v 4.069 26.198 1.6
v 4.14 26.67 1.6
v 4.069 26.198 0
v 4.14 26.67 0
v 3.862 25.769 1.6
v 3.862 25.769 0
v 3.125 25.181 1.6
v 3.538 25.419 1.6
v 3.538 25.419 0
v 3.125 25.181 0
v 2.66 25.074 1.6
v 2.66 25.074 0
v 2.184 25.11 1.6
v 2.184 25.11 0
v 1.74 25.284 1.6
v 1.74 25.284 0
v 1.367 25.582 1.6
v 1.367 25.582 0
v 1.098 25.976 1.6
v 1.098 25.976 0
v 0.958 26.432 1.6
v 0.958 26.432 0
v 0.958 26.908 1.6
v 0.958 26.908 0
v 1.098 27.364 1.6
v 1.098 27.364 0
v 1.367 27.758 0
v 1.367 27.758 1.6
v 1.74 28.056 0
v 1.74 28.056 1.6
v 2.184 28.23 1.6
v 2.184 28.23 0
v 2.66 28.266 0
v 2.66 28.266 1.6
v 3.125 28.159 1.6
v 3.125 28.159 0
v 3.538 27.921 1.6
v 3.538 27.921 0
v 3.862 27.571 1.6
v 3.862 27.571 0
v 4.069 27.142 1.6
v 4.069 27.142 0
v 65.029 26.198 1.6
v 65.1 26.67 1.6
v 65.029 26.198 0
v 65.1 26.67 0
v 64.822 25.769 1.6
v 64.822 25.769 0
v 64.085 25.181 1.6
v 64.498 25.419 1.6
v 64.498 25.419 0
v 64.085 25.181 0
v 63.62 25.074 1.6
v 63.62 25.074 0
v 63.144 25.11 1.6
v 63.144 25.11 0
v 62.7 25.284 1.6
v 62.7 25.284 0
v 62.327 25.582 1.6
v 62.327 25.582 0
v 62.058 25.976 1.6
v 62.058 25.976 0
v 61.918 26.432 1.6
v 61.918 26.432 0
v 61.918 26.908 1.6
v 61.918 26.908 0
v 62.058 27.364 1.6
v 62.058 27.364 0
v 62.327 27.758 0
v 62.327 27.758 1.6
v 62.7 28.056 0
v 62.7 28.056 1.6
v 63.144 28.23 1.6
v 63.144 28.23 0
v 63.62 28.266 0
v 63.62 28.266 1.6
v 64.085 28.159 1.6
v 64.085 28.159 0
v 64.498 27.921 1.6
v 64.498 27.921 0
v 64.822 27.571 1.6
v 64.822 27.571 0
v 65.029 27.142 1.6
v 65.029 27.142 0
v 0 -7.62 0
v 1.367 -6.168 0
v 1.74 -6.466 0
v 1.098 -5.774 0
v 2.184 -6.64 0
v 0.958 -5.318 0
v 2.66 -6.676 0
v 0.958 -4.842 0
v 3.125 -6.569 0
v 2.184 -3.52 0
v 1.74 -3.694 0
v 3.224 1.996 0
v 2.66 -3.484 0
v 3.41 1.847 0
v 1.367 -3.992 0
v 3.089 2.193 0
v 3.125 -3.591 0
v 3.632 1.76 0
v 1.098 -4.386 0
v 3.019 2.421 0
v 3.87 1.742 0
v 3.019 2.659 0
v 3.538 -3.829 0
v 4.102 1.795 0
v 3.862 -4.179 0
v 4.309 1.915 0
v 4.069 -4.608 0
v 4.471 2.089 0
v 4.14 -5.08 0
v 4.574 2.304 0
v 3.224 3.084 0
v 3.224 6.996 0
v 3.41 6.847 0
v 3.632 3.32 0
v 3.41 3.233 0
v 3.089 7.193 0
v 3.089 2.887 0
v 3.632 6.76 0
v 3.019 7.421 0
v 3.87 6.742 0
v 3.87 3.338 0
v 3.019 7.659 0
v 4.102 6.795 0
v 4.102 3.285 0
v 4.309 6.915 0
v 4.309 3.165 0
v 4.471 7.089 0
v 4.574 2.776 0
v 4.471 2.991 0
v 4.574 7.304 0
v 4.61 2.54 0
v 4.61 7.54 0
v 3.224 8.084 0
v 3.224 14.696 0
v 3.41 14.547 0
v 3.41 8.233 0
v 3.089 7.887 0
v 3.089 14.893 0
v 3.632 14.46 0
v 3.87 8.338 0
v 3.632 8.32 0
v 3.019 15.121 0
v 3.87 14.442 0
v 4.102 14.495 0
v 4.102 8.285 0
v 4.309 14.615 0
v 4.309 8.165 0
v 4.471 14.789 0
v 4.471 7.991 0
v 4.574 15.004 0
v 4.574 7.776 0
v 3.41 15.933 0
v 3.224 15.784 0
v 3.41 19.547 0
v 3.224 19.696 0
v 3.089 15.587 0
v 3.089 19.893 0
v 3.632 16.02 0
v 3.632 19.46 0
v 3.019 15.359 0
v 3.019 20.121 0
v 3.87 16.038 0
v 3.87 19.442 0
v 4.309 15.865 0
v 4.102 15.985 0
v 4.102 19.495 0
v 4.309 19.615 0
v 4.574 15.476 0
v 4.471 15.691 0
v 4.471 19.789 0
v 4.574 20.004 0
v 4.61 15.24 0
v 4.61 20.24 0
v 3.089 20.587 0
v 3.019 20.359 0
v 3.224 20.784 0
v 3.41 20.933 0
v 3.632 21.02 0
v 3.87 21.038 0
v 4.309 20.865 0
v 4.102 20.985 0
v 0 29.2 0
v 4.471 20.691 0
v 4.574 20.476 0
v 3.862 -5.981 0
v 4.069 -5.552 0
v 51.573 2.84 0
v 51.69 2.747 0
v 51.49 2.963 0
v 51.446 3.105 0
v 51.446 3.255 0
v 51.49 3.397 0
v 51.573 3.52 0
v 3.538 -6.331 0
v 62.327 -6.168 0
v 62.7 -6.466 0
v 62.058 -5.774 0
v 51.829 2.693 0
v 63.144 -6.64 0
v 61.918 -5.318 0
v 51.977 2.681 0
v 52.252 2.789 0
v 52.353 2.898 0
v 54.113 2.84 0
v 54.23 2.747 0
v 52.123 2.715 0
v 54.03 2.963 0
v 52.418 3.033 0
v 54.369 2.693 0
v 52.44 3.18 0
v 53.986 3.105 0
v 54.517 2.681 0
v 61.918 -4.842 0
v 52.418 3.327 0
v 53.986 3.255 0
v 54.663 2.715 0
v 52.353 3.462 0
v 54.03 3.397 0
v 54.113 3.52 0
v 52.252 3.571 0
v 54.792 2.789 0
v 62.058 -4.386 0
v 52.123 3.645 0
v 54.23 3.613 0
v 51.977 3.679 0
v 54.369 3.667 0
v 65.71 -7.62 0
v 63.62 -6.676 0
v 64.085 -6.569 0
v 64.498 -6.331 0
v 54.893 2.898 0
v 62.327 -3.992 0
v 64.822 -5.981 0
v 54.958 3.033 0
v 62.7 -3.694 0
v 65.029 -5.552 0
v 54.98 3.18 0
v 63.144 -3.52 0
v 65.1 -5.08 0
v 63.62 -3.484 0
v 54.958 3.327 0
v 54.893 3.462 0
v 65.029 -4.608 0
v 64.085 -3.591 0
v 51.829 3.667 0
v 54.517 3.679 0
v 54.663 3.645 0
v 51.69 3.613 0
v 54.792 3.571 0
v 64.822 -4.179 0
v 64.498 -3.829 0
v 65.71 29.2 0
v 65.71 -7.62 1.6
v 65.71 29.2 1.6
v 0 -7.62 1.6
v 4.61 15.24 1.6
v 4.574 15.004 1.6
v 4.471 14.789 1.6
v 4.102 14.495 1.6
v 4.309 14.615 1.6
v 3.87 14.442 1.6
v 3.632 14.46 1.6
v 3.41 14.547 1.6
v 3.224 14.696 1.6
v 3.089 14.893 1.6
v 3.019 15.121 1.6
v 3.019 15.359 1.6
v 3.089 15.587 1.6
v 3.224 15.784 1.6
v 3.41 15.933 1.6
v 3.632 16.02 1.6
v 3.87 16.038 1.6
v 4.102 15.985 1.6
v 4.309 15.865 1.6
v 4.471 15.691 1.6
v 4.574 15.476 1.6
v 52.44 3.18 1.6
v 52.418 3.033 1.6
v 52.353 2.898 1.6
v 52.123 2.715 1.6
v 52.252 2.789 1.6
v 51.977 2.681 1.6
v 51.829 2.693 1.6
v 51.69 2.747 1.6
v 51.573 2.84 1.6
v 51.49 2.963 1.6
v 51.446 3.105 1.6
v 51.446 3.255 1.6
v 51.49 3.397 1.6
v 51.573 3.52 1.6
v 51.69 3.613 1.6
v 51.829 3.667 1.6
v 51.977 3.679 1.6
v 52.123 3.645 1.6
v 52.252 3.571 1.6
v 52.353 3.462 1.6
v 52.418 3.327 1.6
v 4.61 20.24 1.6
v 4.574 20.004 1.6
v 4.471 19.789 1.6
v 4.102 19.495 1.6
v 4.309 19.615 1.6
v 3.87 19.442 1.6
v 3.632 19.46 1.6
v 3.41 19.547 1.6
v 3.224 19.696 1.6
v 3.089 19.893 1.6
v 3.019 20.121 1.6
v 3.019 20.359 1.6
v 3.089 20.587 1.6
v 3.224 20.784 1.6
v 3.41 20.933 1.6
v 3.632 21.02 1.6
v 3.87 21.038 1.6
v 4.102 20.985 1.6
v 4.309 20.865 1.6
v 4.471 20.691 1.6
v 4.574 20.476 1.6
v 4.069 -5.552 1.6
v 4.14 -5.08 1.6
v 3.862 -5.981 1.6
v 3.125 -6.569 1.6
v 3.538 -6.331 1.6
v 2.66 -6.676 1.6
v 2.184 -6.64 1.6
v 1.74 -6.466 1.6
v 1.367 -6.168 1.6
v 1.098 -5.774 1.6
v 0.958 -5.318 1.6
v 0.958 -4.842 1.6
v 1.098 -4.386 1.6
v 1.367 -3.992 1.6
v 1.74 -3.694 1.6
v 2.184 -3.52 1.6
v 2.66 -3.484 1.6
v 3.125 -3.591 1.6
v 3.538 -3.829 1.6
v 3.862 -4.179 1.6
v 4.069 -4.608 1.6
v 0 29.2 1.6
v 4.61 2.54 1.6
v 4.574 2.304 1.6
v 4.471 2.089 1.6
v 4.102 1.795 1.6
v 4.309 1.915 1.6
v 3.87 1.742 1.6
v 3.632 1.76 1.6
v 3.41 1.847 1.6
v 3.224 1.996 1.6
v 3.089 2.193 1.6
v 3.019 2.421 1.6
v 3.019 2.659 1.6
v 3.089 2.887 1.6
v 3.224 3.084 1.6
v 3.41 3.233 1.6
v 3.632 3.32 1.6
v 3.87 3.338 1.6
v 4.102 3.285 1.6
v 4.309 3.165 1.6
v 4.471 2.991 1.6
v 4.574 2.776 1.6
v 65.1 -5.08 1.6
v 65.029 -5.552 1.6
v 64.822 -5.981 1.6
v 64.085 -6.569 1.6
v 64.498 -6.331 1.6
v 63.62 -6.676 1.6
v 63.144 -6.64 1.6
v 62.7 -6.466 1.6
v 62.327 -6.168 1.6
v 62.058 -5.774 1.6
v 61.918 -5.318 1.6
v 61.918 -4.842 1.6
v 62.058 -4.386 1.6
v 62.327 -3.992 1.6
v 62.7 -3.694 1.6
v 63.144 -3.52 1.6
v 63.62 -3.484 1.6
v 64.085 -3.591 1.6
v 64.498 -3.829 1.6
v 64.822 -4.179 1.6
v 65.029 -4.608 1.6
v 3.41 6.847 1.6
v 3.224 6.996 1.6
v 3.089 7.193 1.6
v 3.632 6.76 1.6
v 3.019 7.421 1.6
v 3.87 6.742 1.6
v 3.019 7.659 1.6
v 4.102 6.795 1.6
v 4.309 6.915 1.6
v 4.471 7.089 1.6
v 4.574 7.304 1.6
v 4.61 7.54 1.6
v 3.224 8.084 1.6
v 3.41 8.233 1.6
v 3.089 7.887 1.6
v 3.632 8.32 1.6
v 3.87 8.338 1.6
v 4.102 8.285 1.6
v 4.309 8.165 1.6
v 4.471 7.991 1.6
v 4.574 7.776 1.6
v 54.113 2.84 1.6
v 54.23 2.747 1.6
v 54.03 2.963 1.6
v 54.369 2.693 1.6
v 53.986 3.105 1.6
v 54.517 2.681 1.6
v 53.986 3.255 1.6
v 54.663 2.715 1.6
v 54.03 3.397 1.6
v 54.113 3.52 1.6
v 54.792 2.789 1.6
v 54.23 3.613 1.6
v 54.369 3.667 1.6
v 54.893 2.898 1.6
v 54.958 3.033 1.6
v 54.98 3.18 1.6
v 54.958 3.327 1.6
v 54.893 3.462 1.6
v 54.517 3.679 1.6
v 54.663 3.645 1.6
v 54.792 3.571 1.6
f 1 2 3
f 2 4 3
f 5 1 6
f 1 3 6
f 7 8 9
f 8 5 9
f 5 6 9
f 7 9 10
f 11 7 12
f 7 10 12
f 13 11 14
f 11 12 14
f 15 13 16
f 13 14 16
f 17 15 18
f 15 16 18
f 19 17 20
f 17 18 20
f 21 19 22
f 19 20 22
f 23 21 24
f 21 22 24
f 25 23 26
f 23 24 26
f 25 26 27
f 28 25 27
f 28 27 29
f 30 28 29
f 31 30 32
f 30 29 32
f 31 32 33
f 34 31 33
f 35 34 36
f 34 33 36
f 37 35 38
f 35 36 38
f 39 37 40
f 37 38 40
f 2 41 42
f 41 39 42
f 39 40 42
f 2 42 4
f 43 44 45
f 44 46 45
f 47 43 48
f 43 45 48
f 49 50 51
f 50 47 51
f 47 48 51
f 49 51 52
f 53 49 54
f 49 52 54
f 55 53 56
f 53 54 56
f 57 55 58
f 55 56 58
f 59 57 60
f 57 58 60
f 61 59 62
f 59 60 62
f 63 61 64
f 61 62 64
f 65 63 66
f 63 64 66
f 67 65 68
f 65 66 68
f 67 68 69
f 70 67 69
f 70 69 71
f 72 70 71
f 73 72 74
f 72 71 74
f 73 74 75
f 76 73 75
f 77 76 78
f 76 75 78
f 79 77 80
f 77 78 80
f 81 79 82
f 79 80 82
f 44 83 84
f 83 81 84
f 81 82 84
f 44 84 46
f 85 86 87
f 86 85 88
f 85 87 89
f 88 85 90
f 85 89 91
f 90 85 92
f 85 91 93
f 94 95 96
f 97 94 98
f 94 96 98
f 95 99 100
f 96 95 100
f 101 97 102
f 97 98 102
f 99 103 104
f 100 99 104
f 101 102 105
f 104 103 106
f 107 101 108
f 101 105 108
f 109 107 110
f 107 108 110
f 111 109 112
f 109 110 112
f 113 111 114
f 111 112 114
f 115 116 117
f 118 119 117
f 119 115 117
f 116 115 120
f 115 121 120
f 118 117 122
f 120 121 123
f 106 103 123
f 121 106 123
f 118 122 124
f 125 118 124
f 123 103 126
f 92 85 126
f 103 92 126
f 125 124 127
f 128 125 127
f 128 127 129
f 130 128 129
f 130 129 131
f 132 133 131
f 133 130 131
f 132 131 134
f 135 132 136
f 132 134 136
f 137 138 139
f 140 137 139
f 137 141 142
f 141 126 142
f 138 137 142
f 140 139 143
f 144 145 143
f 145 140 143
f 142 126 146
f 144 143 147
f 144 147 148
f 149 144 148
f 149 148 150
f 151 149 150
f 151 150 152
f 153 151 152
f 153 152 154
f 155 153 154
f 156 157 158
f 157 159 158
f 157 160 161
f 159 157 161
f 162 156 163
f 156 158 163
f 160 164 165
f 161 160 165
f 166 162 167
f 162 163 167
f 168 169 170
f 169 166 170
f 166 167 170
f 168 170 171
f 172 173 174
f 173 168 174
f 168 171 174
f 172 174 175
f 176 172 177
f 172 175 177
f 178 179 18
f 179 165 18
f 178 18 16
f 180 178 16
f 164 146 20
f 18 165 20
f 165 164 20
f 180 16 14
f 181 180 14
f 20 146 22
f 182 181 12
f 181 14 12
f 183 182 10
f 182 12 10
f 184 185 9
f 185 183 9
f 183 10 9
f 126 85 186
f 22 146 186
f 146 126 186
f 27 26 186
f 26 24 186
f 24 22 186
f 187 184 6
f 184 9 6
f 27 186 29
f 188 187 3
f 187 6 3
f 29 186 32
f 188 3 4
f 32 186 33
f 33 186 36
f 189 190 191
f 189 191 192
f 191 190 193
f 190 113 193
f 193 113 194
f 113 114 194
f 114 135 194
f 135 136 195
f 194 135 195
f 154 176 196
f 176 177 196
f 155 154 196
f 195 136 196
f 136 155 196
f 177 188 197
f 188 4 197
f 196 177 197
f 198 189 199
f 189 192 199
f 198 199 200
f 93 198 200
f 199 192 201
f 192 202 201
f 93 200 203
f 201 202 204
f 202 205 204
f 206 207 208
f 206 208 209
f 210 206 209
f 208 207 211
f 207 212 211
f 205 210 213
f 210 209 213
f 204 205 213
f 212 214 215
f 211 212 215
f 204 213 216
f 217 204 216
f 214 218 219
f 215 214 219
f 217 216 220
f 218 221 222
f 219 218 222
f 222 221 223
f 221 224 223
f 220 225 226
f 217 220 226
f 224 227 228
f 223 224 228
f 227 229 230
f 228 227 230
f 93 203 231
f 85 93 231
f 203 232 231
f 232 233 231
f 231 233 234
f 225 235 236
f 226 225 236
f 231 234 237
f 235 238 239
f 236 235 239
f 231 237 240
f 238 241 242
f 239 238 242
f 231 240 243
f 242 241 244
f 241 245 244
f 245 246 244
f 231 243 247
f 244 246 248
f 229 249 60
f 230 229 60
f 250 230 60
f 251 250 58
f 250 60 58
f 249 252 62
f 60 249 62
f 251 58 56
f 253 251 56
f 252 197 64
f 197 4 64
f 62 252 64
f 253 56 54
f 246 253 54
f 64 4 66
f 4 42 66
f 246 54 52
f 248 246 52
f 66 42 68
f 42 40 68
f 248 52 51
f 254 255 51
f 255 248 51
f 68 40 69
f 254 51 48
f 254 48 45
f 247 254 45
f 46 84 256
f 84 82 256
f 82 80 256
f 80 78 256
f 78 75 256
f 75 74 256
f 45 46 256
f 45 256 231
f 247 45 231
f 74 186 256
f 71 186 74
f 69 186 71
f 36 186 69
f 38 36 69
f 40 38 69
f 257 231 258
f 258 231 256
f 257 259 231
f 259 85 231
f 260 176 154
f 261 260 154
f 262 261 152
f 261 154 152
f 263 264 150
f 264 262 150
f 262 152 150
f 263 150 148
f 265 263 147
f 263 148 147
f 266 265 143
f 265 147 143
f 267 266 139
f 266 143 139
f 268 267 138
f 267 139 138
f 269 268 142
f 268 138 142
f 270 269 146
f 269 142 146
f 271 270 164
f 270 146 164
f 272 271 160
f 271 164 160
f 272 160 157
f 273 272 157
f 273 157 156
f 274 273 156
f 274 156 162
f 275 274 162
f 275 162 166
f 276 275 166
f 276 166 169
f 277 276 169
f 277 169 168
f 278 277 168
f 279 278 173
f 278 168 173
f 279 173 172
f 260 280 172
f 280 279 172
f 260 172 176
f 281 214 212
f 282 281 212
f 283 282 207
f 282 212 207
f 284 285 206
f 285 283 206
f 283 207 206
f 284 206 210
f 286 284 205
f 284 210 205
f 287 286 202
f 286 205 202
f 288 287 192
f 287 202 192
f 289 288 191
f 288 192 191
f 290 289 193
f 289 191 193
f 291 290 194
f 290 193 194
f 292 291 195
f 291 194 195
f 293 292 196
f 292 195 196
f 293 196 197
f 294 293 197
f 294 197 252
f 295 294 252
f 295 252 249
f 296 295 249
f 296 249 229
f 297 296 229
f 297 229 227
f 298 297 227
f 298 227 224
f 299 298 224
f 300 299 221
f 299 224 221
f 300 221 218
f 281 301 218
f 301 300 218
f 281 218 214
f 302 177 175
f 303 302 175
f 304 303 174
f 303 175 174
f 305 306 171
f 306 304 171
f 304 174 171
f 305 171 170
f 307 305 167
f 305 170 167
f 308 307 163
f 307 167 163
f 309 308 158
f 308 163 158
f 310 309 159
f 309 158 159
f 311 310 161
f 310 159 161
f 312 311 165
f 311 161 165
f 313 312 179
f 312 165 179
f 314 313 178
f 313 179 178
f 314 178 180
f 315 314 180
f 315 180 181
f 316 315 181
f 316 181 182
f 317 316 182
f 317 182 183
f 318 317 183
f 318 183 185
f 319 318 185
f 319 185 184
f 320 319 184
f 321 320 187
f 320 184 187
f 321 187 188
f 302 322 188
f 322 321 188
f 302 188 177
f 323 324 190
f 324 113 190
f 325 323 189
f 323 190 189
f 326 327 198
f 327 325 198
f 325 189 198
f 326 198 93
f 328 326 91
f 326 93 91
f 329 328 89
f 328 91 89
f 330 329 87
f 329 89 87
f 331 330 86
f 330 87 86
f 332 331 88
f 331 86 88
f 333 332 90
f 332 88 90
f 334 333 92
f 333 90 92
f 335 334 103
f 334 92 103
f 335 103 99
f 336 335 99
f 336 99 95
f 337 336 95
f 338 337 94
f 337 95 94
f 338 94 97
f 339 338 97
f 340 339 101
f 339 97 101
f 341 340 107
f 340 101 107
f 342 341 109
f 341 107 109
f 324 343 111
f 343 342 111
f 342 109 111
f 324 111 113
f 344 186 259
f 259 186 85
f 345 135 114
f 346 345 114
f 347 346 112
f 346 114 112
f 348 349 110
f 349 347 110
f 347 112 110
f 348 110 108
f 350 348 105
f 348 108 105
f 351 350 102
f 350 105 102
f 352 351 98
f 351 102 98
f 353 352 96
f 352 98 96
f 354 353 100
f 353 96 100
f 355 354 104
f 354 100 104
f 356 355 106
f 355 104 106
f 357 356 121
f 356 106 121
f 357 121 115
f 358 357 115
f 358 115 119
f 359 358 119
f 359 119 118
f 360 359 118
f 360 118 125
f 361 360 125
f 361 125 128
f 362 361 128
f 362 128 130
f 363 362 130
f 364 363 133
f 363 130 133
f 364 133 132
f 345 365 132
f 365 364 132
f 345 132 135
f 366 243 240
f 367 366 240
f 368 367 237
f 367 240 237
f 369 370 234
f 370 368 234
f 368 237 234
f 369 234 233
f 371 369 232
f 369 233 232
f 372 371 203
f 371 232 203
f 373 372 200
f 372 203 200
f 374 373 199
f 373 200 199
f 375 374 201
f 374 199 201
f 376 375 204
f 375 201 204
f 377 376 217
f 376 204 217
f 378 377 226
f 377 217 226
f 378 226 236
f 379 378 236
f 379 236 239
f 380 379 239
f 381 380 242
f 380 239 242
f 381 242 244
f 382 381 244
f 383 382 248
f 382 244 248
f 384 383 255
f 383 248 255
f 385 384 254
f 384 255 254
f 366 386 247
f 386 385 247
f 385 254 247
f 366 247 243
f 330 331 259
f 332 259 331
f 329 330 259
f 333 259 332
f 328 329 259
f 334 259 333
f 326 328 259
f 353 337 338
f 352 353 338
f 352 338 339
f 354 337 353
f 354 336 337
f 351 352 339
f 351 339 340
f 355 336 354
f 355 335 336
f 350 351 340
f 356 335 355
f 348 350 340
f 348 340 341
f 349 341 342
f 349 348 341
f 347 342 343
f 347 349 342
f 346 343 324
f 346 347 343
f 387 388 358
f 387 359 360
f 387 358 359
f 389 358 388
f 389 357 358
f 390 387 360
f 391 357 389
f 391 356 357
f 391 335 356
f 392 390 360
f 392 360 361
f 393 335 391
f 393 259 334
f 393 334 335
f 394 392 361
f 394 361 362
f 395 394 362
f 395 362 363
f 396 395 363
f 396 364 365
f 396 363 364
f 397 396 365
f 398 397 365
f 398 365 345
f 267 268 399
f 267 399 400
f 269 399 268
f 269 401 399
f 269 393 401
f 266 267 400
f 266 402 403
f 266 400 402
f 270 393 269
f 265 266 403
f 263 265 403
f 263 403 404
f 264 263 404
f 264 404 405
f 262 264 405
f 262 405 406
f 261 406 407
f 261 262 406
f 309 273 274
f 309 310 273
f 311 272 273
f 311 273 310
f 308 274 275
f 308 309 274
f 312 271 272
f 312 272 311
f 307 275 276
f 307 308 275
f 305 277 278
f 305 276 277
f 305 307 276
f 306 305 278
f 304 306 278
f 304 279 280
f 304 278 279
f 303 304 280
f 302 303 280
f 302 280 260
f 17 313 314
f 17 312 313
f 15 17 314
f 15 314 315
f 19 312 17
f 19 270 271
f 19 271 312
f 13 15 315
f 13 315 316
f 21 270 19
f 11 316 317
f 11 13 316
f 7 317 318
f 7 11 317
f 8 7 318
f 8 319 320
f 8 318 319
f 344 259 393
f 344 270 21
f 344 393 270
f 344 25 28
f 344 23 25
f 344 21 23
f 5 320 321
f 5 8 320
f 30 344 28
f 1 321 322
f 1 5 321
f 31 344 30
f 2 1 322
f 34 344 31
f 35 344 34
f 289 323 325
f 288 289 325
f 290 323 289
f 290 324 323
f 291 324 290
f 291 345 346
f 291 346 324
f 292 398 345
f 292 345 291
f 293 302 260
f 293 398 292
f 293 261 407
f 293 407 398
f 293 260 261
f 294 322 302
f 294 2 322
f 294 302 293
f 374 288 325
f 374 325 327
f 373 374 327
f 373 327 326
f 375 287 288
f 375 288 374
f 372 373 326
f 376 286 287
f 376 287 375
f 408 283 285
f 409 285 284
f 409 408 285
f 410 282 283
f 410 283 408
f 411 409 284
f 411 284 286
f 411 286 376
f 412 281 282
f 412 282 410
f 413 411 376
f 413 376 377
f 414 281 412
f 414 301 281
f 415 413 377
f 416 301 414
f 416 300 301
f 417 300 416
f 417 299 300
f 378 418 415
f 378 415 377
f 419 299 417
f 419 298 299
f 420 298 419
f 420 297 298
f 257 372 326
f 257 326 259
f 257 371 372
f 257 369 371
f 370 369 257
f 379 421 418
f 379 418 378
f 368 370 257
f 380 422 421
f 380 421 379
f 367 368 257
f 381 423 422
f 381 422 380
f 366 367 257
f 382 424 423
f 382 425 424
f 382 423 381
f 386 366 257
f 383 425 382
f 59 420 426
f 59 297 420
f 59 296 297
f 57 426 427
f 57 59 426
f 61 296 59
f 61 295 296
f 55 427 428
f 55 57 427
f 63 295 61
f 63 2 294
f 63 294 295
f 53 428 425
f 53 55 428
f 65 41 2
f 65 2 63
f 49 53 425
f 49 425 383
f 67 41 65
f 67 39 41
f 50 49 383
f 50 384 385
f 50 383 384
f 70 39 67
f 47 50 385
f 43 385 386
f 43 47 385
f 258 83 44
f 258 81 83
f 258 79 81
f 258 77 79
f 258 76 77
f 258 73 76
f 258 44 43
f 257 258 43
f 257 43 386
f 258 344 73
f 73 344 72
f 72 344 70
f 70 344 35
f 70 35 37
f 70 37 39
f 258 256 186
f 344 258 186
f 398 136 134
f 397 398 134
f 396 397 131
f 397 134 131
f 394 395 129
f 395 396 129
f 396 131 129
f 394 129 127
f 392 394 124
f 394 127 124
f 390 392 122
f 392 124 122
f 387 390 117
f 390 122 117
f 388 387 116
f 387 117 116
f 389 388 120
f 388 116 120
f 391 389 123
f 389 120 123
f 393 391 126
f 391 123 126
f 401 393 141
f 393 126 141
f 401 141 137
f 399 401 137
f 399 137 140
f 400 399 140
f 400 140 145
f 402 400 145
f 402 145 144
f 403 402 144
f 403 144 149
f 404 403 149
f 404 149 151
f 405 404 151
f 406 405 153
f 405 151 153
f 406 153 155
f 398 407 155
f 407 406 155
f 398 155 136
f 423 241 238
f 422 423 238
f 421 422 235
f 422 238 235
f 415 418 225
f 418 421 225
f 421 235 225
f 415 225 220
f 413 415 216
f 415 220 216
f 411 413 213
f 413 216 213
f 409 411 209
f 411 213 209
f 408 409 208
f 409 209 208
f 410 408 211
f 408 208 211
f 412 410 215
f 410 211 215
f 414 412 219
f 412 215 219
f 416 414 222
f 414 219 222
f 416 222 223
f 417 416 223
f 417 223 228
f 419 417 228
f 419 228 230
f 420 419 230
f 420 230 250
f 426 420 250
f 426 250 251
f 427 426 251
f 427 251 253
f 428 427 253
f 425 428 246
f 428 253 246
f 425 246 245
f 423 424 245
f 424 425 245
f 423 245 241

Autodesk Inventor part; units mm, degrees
ref_plane "YZ Plane" through (0, 0, 0) normal (1, 0, 0) x (0, 1, 0)
ref_plane "XZ Plane" through (0, 0, 0) normal (0, 1, 0) x (-1, 0, 0)
ref_plane "XY Plane" through (0, 0, 0) normal (0, 0, 1) x (1, 0, 0)
sketch "Эскиз1" plane through (0, 0, 0) normal (0, 0, 1) x (1, 0, 0)
  line L0 (0, -7.62) -> (65.71, -7.62)
  line L1 (65.71, -7.62) -> (65.71, 29.2)
  line L2 (65.71, 29.2) -> (0, 29.2)
  line L3 (0, 29.2) -> (0, -7.62)
  circle A0 centre (3.81, 15.24) radius 0.8
  circle A1 centre (3.81, 20.24) radius 0.8
  circle A2 centre (3.81, 2.54) radius 0.8
  circle A3 centre (3.81, 7.54) radius 0.8
  circle A4 centre (51.94, 3.18) radius 0.5
  circle A5 centre (54.48, 3.18) radius 0.5
  circle A6 centre (2.54, 26.67) radius 1.6
  circle A7 centre (2.54, -5.08) radius 1.6
  circle A8 centre (63.5, -5.08) radius 1.6
  circle A9 centre (63.5, 26.67) radius 1.6
extrude "untitled.brdКонтур" add sketch "Эскиз1" along normal blind 1.6
properties part number "untitled.brdКонтур"
